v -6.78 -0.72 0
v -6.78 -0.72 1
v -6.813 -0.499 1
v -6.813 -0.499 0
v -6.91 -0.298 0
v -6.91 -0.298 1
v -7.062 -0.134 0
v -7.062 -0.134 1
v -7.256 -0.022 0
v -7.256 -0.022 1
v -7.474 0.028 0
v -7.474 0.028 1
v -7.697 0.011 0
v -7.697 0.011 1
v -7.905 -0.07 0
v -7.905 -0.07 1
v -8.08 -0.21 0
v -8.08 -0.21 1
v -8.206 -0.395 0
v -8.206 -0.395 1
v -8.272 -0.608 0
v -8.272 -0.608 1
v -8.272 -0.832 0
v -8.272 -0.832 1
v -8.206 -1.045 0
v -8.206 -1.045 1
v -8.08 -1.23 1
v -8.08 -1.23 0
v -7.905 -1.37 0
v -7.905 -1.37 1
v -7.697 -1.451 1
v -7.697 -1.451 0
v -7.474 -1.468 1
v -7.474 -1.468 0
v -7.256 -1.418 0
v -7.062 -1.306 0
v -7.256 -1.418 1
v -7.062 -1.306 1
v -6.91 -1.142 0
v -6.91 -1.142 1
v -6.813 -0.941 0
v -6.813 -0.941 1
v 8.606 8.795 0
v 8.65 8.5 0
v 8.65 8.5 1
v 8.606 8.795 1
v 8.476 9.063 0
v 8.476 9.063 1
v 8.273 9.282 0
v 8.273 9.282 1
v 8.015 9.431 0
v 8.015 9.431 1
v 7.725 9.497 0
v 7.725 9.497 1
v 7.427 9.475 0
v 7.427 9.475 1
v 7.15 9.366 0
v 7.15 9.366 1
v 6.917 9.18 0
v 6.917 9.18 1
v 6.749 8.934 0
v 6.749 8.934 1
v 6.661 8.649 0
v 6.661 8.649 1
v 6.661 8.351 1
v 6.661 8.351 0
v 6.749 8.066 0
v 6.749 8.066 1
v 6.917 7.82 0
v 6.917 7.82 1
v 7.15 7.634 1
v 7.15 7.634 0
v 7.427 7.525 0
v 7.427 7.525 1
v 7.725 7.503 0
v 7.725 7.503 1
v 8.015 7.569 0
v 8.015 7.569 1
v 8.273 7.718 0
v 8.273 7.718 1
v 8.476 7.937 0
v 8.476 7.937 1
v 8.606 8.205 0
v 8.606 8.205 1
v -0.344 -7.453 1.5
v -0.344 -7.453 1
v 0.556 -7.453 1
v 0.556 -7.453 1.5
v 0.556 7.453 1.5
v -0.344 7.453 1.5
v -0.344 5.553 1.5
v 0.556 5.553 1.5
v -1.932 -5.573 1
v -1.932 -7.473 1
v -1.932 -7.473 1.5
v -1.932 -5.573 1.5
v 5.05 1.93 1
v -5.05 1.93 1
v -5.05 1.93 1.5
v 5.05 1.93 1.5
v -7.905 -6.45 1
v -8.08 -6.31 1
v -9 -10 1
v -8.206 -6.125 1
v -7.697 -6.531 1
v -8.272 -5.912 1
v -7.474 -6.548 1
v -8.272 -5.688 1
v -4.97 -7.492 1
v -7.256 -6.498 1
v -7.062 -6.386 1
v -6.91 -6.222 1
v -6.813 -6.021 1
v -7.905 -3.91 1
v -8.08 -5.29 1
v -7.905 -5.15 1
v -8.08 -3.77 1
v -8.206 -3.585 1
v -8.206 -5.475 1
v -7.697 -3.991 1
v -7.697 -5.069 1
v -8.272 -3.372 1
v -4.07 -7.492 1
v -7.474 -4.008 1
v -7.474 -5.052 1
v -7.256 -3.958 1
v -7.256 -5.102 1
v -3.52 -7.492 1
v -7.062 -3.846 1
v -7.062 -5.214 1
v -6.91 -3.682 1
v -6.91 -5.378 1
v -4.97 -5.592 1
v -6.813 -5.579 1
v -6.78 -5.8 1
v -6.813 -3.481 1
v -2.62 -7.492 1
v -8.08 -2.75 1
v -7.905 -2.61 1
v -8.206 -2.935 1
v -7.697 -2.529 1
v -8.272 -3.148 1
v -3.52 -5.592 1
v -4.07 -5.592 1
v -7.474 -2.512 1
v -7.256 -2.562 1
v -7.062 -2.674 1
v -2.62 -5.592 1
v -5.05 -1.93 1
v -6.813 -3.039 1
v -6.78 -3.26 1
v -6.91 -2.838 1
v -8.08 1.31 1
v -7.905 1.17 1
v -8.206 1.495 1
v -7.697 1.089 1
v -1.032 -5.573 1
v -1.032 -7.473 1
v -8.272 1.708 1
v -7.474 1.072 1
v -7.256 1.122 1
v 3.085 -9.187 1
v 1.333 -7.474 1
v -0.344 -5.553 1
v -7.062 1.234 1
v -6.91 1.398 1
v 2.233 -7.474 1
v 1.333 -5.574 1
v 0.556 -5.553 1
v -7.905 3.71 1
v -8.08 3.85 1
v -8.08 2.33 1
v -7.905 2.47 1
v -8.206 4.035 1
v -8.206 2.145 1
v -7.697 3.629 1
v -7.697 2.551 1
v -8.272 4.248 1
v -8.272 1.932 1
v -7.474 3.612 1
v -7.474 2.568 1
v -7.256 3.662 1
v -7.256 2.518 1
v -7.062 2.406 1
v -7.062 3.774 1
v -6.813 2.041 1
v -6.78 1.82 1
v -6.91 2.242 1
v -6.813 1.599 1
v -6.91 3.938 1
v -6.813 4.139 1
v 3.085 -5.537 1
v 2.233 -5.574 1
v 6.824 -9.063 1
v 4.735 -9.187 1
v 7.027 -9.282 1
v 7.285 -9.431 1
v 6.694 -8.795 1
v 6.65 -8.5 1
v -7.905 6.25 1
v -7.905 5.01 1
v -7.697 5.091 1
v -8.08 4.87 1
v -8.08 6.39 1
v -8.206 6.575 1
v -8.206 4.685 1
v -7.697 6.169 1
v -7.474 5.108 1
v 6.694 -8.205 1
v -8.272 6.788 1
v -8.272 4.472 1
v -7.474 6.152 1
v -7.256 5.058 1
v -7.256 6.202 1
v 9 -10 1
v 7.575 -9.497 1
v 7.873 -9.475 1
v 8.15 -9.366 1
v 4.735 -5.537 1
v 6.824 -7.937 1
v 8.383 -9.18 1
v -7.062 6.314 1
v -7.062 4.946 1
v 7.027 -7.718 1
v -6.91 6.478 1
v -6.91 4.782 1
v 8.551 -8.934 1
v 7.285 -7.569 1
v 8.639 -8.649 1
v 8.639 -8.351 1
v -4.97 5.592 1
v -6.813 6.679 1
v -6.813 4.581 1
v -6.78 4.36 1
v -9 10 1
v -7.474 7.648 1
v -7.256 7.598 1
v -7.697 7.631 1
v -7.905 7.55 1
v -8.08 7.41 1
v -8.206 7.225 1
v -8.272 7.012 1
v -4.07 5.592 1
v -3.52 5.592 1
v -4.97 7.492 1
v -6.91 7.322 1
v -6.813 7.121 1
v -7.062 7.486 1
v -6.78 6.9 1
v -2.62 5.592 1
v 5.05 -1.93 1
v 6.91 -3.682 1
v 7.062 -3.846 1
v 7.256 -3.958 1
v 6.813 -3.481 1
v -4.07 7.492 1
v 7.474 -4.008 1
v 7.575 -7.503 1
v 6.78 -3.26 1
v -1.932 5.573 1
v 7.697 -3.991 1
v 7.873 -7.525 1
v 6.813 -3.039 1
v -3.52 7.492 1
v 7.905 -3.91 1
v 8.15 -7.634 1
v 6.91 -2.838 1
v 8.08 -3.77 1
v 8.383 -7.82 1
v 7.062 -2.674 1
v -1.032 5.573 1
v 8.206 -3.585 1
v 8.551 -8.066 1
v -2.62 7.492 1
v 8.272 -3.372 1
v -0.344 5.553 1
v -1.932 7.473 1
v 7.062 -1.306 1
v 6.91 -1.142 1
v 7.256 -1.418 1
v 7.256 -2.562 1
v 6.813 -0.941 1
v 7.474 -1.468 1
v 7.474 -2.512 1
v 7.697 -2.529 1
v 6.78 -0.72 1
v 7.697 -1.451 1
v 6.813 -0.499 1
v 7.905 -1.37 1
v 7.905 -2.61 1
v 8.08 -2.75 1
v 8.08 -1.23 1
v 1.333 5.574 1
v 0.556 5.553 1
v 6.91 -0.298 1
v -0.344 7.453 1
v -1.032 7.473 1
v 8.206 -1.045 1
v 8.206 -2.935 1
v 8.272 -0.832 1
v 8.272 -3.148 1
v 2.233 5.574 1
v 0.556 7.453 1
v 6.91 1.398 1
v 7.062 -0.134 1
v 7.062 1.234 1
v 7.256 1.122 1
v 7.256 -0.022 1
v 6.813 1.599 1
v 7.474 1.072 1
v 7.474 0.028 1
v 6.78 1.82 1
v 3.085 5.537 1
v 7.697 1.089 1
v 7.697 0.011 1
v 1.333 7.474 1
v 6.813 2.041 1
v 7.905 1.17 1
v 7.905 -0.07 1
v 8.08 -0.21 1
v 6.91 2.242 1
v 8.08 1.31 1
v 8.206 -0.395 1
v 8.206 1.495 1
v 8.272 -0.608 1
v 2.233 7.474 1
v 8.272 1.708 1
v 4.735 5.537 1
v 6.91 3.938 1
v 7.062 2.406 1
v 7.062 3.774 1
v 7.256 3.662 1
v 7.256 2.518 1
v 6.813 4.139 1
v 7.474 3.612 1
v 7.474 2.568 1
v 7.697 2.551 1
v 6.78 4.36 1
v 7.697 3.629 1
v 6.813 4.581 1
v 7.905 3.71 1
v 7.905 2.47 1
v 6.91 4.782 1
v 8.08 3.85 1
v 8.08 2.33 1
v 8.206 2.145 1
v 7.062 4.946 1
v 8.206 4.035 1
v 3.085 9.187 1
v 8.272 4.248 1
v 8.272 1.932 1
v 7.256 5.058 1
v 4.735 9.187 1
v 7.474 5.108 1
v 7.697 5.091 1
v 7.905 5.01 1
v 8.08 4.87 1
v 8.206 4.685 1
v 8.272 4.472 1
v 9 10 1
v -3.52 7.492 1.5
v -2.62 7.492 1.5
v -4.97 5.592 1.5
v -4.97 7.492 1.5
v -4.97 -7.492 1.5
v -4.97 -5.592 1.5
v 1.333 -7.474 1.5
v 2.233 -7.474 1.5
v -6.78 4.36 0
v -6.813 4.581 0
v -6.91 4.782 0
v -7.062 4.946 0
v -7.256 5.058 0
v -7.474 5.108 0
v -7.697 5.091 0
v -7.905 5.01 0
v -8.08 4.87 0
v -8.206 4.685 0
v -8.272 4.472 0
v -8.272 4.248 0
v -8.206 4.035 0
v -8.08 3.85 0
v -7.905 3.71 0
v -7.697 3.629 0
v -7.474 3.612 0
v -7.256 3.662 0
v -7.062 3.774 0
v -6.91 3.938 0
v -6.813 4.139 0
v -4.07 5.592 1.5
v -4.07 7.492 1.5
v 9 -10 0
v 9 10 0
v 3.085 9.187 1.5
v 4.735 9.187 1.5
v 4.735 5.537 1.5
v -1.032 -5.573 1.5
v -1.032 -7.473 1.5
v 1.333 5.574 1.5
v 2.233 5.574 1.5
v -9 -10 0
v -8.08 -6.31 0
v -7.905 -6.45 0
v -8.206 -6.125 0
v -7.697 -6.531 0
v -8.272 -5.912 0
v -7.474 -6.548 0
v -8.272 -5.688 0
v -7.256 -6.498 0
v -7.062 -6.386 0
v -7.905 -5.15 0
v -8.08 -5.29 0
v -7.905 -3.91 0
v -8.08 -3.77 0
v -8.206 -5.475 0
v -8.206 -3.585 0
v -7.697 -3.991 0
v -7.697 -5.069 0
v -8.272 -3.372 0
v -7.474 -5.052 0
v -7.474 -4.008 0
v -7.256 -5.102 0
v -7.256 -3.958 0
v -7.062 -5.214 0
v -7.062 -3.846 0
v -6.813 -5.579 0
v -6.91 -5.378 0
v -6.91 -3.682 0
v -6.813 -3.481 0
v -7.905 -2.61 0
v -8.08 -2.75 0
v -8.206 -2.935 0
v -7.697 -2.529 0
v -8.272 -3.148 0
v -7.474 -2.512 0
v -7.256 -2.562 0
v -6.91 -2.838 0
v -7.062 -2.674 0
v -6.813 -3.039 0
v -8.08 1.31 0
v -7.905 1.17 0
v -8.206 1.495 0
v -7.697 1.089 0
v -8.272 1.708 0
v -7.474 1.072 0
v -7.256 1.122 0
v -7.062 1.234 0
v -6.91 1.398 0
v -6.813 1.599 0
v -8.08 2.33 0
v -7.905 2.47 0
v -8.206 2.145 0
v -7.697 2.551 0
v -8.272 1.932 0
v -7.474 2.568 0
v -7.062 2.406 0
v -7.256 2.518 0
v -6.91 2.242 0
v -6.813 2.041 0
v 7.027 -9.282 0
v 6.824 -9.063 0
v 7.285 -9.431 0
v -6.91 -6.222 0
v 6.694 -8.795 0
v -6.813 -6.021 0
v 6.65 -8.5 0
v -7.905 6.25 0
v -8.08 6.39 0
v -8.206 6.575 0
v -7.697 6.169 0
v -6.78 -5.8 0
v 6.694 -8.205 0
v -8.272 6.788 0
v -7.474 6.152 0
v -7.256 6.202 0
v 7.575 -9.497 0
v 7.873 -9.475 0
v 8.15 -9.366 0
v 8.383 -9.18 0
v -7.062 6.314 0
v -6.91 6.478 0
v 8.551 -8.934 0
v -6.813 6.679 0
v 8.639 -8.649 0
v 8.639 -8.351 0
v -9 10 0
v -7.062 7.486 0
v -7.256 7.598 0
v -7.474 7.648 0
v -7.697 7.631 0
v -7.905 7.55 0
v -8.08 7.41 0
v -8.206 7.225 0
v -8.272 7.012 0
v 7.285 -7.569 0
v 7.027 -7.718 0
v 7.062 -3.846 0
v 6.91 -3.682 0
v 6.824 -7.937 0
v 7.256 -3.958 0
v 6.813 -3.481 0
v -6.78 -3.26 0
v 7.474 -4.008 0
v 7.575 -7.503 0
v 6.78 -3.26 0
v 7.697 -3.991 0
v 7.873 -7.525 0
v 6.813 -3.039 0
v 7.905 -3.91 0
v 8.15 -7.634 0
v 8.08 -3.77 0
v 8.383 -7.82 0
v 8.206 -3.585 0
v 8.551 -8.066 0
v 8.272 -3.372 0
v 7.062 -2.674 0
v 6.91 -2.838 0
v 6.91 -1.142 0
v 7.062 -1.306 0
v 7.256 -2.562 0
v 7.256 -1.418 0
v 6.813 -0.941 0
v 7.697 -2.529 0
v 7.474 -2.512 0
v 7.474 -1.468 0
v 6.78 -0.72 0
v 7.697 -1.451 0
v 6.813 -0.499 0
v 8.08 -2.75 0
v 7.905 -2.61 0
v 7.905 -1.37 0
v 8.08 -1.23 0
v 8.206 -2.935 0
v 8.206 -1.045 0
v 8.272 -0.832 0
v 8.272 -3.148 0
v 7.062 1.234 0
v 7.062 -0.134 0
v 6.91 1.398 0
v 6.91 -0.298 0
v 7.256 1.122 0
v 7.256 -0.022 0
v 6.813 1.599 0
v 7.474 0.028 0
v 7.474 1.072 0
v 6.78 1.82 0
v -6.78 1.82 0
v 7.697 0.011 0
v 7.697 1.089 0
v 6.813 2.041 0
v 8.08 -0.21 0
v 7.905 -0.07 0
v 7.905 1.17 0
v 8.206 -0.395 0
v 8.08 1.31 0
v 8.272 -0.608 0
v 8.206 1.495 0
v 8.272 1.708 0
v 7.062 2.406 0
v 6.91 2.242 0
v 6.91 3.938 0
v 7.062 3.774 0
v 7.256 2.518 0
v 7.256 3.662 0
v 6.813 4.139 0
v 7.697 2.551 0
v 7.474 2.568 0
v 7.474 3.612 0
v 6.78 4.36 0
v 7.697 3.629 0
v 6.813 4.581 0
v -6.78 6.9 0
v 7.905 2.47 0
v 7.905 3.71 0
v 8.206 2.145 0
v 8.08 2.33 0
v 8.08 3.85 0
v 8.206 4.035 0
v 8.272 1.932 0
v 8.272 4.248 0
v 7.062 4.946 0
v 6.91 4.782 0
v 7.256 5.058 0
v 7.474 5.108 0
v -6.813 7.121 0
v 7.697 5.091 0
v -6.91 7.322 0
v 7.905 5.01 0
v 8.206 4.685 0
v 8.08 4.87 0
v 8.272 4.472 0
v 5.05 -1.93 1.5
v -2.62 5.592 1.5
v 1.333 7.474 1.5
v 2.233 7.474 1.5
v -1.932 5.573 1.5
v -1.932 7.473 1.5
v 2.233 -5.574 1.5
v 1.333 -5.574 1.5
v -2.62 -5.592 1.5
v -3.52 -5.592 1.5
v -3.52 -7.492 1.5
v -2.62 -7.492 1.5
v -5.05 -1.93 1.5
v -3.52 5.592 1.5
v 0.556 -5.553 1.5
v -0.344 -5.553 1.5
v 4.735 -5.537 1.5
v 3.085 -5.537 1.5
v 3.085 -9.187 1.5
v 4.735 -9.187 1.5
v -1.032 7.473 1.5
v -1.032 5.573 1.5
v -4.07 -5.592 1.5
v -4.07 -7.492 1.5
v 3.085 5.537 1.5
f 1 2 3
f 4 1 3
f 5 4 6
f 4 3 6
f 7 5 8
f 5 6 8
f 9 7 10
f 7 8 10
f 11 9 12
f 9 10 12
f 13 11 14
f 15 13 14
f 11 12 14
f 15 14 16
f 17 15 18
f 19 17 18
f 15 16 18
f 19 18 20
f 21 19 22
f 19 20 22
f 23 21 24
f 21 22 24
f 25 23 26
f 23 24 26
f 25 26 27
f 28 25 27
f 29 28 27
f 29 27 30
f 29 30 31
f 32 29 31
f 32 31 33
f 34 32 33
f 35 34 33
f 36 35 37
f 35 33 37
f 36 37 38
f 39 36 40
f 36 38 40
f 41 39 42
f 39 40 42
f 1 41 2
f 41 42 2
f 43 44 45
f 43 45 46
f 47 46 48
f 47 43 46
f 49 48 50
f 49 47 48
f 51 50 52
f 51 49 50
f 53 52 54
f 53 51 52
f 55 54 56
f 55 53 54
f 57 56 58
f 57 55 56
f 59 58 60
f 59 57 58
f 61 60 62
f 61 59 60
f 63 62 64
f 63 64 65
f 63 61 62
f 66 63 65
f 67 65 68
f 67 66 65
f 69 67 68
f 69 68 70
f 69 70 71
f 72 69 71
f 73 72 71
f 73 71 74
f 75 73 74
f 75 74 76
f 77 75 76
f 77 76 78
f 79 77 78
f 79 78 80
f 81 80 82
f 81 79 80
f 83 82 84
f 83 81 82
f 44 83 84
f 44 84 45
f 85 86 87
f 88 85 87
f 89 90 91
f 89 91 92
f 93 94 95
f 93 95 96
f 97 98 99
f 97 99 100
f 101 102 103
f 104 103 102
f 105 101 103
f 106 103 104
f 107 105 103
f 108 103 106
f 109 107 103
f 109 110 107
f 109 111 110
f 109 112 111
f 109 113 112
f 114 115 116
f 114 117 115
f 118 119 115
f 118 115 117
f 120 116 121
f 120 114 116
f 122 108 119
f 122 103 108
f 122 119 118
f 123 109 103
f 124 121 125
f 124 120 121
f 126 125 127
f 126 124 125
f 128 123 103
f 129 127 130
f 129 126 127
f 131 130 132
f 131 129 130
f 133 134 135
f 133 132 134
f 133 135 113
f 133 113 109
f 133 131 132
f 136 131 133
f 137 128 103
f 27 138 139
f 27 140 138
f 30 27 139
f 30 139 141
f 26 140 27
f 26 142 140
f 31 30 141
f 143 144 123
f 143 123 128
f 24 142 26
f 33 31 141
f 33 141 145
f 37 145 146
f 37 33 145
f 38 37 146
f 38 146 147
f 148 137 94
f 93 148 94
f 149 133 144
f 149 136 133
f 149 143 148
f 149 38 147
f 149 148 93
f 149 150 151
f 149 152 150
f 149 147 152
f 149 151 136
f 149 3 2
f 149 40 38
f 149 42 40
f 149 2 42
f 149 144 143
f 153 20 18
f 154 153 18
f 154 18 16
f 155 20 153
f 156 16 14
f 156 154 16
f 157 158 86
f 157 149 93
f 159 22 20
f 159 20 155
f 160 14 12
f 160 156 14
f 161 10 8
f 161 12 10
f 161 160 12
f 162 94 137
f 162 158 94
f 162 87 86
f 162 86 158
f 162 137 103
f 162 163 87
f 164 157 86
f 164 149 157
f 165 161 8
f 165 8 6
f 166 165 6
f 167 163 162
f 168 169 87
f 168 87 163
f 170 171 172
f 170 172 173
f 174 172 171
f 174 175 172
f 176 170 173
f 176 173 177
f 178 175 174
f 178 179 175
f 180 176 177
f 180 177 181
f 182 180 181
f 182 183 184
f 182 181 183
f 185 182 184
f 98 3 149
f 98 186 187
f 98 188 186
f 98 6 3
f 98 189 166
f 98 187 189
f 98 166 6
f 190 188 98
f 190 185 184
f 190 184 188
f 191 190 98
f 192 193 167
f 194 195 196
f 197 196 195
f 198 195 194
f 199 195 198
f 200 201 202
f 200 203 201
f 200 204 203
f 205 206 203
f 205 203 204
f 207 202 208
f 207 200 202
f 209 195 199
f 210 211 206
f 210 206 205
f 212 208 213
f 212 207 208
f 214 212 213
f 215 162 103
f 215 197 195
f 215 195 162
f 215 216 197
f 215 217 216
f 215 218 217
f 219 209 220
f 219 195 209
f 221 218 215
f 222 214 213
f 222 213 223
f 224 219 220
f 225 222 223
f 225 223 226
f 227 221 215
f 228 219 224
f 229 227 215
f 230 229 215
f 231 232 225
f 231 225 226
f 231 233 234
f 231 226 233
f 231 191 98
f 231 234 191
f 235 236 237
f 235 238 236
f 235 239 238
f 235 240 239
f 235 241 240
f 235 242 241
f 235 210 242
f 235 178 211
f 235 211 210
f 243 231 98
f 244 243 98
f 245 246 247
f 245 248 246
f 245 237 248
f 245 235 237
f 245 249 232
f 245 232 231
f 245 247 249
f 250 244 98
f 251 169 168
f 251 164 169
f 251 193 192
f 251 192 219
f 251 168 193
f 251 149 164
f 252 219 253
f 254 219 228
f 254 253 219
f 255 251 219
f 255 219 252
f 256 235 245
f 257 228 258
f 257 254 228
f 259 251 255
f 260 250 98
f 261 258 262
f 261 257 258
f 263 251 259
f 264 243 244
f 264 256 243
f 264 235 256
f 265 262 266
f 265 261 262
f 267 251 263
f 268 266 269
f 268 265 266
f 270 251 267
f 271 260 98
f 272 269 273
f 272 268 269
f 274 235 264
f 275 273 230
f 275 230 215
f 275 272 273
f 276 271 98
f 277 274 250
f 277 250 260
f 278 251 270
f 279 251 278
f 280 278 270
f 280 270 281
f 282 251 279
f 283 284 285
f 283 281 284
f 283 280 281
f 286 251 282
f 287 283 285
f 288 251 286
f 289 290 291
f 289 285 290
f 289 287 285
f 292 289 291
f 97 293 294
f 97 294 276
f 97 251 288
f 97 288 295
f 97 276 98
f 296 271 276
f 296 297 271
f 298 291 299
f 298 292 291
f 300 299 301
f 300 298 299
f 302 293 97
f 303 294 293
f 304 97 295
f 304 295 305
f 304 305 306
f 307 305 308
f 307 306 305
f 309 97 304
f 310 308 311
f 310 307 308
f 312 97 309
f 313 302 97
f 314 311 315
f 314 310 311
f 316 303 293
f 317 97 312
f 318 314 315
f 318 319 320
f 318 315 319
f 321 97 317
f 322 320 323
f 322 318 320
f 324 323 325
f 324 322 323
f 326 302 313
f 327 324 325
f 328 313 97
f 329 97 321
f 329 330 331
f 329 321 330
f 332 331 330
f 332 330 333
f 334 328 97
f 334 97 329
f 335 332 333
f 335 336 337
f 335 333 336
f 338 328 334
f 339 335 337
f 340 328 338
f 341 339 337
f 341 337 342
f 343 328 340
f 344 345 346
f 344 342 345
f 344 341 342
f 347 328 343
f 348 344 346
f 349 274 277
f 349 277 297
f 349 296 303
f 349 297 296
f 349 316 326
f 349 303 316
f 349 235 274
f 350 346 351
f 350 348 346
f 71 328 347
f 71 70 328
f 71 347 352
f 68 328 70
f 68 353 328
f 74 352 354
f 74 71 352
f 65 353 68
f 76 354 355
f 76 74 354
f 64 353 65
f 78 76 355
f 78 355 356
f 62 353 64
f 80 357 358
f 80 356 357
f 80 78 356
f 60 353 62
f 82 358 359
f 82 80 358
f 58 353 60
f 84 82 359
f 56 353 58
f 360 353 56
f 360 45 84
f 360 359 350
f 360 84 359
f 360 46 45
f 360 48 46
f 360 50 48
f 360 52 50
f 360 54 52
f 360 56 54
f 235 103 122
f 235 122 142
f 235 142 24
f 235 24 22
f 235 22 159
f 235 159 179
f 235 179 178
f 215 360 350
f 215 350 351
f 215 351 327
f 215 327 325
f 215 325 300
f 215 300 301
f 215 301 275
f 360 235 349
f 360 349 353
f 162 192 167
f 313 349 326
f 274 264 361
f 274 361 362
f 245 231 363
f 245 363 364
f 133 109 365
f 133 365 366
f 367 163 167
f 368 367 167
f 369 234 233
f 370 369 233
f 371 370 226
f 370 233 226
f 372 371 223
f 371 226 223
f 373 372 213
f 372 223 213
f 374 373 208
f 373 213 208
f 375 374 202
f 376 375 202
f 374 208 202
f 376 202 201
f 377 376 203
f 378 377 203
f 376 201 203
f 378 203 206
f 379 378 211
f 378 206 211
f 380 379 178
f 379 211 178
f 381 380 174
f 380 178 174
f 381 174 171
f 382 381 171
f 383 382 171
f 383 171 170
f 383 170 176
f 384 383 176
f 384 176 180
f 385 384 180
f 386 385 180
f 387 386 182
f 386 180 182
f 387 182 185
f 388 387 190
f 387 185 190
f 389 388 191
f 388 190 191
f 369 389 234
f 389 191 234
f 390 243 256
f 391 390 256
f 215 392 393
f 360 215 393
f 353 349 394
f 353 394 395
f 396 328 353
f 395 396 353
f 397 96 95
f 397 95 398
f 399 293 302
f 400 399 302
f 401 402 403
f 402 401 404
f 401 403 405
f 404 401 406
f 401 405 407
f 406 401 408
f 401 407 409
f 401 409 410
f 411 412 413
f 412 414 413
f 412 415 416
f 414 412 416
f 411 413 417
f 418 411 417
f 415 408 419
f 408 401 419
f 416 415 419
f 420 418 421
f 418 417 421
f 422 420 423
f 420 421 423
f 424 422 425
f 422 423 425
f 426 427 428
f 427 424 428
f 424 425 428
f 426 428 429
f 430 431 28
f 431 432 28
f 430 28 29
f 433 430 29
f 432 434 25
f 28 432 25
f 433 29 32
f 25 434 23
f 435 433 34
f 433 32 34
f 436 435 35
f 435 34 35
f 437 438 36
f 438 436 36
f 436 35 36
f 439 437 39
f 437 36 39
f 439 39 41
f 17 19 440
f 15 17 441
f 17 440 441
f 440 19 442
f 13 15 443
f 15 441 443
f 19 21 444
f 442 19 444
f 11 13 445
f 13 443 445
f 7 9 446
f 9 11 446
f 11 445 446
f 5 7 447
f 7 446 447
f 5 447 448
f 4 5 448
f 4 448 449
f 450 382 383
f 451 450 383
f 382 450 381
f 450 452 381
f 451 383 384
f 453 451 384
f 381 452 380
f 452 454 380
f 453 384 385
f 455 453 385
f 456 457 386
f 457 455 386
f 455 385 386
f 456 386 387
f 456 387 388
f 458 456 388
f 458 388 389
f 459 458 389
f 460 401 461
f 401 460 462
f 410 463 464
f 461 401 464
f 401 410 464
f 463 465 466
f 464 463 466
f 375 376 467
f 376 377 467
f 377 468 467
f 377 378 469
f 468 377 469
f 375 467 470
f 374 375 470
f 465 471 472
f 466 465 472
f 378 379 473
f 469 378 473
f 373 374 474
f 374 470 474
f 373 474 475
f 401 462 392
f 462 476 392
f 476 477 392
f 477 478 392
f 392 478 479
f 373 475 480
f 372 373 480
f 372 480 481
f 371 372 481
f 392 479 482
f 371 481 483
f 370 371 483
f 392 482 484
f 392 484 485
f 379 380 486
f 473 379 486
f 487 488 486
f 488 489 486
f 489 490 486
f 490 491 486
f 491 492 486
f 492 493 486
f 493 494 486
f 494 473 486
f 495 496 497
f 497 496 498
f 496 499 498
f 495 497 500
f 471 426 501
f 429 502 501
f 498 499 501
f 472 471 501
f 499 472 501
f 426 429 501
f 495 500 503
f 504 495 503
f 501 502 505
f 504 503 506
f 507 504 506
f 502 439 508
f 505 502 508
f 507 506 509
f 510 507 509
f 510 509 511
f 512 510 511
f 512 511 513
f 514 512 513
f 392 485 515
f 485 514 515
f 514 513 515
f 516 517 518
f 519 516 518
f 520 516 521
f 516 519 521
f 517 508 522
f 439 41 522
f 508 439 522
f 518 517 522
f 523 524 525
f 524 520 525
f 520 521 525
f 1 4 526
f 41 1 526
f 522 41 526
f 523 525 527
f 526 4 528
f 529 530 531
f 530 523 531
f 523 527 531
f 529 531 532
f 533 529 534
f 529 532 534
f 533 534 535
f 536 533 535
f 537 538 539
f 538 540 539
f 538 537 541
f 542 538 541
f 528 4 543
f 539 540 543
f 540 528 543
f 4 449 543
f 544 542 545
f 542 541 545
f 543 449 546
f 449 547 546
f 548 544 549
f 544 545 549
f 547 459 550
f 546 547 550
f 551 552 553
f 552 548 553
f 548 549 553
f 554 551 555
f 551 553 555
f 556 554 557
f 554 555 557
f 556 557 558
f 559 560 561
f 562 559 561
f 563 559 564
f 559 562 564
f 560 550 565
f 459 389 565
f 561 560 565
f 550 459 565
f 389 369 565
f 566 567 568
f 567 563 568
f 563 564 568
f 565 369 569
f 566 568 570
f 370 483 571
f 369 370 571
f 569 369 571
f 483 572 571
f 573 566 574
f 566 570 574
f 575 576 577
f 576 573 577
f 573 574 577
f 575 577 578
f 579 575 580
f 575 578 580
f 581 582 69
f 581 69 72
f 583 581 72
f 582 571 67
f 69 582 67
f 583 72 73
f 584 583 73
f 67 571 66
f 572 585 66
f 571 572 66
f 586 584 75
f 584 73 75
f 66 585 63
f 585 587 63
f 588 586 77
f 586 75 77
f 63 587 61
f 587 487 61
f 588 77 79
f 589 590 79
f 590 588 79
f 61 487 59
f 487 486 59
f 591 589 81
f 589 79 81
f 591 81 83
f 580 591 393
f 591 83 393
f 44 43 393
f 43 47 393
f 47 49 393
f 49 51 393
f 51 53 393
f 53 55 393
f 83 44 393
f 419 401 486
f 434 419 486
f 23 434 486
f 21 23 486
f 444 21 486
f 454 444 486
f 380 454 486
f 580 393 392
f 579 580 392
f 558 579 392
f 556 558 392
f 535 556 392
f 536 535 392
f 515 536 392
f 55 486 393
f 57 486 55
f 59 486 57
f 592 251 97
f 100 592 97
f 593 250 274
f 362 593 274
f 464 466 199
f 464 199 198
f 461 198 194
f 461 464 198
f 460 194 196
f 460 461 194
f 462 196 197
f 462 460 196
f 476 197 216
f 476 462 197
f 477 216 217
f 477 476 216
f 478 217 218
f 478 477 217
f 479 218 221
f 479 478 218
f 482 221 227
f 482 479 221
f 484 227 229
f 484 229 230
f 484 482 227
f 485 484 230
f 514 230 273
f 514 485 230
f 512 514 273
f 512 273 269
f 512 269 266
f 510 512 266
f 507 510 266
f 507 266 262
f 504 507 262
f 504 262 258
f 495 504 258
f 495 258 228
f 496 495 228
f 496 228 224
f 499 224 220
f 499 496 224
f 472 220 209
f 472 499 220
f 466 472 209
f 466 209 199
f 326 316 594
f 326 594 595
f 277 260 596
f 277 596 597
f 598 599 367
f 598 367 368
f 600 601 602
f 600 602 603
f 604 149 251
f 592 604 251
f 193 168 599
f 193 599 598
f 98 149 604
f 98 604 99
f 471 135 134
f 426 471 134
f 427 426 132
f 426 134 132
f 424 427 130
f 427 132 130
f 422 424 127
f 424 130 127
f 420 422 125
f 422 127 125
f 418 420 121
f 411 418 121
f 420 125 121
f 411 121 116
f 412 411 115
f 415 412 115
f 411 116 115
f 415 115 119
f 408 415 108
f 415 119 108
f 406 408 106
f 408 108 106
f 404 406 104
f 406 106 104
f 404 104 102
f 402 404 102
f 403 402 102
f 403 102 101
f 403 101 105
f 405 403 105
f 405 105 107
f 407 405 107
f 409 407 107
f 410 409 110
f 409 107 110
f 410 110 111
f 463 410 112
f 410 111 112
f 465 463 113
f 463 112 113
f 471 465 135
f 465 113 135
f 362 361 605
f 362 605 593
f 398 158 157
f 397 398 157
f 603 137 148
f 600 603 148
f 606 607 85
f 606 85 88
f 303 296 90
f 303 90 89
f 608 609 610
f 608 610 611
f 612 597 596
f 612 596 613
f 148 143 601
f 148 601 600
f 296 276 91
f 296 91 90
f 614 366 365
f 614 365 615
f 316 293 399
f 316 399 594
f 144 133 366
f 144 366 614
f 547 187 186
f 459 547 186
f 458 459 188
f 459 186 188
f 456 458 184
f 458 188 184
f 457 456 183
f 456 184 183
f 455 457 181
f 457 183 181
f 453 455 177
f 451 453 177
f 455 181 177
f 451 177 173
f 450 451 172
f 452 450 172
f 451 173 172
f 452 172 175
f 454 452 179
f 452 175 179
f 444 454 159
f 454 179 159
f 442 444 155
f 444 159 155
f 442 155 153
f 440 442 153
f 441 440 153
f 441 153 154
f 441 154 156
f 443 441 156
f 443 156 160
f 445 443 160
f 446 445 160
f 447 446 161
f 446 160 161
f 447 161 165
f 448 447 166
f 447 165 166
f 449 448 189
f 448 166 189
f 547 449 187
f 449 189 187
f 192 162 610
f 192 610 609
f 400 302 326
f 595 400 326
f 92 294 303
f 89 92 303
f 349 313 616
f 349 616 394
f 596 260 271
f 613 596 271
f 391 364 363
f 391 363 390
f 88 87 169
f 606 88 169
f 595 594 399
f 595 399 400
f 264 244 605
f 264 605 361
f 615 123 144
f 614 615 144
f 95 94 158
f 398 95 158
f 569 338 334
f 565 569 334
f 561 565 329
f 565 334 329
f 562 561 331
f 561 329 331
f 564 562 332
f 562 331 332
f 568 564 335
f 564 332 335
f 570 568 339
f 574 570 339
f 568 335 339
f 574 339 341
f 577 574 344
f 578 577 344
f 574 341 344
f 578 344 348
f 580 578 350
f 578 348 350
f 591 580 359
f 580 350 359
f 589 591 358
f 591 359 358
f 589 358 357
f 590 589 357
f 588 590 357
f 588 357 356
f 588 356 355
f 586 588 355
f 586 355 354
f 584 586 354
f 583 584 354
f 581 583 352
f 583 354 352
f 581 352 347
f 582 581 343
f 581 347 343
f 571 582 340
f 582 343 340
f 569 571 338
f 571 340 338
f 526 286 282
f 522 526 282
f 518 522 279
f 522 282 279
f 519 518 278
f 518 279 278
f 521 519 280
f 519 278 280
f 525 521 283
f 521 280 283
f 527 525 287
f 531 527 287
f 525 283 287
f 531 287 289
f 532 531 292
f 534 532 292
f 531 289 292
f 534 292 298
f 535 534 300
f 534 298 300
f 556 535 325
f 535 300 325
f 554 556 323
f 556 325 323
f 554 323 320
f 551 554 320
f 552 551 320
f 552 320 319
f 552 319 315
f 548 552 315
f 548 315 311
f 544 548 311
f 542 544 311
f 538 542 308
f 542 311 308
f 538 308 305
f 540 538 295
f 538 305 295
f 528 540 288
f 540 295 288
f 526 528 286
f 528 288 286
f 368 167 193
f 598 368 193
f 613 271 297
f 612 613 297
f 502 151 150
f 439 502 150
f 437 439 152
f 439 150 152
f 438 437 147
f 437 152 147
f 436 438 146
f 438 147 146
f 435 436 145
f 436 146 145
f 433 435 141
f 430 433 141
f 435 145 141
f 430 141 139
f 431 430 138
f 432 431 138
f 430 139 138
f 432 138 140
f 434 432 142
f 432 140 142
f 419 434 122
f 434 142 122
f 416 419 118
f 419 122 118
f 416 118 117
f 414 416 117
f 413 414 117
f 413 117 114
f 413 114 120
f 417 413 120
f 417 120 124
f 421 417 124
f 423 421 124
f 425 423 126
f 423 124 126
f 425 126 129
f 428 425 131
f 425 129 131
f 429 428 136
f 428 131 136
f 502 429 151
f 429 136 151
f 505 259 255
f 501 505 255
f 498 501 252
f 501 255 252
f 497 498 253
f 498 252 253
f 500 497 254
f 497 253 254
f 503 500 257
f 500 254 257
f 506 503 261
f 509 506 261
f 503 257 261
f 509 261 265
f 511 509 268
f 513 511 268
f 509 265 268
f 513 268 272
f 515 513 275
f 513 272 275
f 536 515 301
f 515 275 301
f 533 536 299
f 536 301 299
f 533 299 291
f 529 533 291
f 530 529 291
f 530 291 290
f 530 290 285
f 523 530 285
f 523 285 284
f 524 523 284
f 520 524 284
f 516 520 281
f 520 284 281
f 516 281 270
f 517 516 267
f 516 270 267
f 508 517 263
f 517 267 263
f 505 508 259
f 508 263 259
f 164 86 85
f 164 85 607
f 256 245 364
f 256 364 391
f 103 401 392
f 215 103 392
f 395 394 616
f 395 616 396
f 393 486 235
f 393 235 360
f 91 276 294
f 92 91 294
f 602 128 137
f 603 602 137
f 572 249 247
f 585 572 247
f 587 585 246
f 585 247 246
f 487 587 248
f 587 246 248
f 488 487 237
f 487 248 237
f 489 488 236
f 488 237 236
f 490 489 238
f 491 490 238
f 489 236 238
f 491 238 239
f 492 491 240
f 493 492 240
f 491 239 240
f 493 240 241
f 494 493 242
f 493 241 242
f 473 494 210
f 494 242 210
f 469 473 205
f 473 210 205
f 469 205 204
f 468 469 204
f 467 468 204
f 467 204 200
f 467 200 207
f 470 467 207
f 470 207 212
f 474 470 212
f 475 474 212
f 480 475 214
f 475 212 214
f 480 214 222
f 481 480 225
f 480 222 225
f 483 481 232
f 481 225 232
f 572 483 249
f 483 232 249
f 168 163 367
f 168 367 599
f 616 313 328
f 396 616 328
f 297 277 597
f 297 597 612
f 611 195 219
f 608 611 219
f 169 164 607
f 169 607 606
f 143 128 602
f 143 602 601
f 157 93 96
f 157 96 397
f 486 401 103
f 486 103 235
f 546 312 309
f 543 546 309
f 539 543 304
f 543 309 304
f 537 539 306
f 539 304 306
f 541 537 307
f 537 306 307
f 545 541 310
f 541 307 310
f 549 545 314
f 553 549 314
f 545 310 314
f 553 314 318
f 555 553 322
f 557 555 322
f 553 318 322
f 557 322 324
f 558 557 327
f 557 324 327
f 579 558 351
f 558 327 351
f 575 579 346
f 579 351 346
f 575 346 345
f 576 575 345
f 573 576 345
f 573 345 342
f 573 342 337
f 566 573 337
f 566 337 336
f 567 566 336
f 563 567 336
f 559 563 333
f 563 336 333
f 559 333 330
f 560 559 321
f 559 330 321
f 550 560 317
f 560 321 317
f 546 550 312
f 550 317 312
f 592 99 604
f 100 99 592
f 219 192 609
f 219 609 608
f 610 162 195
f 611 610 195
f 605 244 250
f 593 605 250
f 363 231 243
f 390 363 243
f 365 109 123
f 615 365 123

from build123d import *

# Parameters (mm, degrees)
SKETCH1_W           = 18
SKETCH1_H           = 20
SKETCH1_R           = 1
BOSS_EXTRUDE1_DEPTH = 1
SKETCH2_R           = 0.75
CUT_EXTRUDE1_DEPTH  = 1
SKETCH3_W           = 10.1
SKETCH3_H           = 3.86
BOSS_EXTRUDE3_DEPTH = 0.5
SKETCH4_W           = 0.9
SKETCH4_H           = 1.9
SKETCH4_W_2         = 1.65
SKETCH4_H_2         = 3.65
BOSS_EXTRUDE4_DEPTH = 0.5


with BuildPart() as part:
    # Sketch1 → Boss-Extrude1 (new body)
    with BuildSketch(Plane.XY):
        Rectangle(SKETCH1_W, SKETCH1_H)
        with Locations((7.65, 8.5)):
            Circle(SKETCH1_R, mode=Mode.SUBTRACT)
        with Locations(Location((7.65, -8.5, 0), (0, 0, 180))):
            Circle(SKETCH1_R, mode=Mode.SUBTRACT)
    extrude(amount=BOSS_EXTRUDE1_DEPTH)

    # Sketch2 → Cut-Extrude1 (cut)
    with BuildSketch(Plane.XY.offset(1)):
        with Locations((-7.53, 6.9)):
            Circle(SKETCH2_R)
        with Locations((-7.53, 4.36)):
            Circle(SKETCH2_R)
        with Locations((-7.53, 1.82)):
            Circle(SKETCH2_R)
        with Locations((-7.53, -0.72)):
            Circle(SKETCH2_R)
        with Locations((-7.53, -3.26)):
            Circle(SKETCH2_R)
        with Locations((-7.53, -5.8)):
            Circle(SKETCH2_R)
        with Locations(Location((7.53, -3.26, 0), (0, 0, 180))):
            Circle(SKETCH2_R)
        with Locations(Location((7.53, -0.72, 0), (0, 0, 180))):
            Circle(SKETCH2_R)
        with Locations(Location((7.53, 1.82, 0), (0, 0, 180))):
            Circle(SKETCH2_R)
        with Locations(Location((7.53, 4.36, 0), (0, 0, 180))):
            Circle(SKETCH2_R)
    extrude(amount=-CUT_EXTRUDE1_DEPTH, mode=Mode.SUBTRACT)

    # Sketch3 → Boss-Extrude3 (add)
    with BuildSketch(Plane.XY.offset(1)):
        Rectangle(SKETCH3_W, SKETCH3_H)
    extrude(amount=BOSS_EXTRUDE3_DEPTH)

    # Sketch4 → Boss-Extrude4 (add)
    with BuildSketch(Plane.XY.offset(1)):
        with Locations((-4.519825255, 6.542108994)):
            Rectangle(SKETCH4_W, SKETCH4_H)
        with Locations((-3.070068301, 6.542108994)):
            Rectangle(SKETCH4_W, SKETCH4_H)
        with Locations((-1.482219023, 6.522505917)):
            Rectangle(SKETCH4_W, SKETCH4_H)
        with Locations((0.105630256, 6.502902839)):
            Rectangle(SKETCH4_W, SKETCH4_H)
        with Locations((1.782648632, 6.524274443)):
            Rectangle(SKETCH4_W, SKETCH4_H)
        with Locations((3.910298039, 7.361938069)):
            Rectangle(SKETCH4_W_2, SKETCH4_H_2)
        with Locations((3.910298039, -7.361938069)):
            Rectangle(SKETCH4_W_2, SKETCH4_H_2)
        with Locations((1.782648632, -6.524274443)):
            Rectangle(SKETCH4_W, SKETCH4_H)
        with Locations((0.105630256, -6.502902839)):
            Rectangle(SKETCH4_W, SKETCH4_H)
        with Locations((-1.482219023, -6.522505917)):
            Rectangle(SKETCH4_W, SKETCH4_H)
        with Locations((-3.070068301, -6.542108994)):
            Rectangle(SKETCH4_W, SKETCH4_H)
        with Locations((-4.519825255, -6.542108994)):
            Rectangle(SKETCH4_W, SKETCH4_H)
    extrude(amount=BOSS_EXTRUDE4_DEPTH)


solid = part.part
